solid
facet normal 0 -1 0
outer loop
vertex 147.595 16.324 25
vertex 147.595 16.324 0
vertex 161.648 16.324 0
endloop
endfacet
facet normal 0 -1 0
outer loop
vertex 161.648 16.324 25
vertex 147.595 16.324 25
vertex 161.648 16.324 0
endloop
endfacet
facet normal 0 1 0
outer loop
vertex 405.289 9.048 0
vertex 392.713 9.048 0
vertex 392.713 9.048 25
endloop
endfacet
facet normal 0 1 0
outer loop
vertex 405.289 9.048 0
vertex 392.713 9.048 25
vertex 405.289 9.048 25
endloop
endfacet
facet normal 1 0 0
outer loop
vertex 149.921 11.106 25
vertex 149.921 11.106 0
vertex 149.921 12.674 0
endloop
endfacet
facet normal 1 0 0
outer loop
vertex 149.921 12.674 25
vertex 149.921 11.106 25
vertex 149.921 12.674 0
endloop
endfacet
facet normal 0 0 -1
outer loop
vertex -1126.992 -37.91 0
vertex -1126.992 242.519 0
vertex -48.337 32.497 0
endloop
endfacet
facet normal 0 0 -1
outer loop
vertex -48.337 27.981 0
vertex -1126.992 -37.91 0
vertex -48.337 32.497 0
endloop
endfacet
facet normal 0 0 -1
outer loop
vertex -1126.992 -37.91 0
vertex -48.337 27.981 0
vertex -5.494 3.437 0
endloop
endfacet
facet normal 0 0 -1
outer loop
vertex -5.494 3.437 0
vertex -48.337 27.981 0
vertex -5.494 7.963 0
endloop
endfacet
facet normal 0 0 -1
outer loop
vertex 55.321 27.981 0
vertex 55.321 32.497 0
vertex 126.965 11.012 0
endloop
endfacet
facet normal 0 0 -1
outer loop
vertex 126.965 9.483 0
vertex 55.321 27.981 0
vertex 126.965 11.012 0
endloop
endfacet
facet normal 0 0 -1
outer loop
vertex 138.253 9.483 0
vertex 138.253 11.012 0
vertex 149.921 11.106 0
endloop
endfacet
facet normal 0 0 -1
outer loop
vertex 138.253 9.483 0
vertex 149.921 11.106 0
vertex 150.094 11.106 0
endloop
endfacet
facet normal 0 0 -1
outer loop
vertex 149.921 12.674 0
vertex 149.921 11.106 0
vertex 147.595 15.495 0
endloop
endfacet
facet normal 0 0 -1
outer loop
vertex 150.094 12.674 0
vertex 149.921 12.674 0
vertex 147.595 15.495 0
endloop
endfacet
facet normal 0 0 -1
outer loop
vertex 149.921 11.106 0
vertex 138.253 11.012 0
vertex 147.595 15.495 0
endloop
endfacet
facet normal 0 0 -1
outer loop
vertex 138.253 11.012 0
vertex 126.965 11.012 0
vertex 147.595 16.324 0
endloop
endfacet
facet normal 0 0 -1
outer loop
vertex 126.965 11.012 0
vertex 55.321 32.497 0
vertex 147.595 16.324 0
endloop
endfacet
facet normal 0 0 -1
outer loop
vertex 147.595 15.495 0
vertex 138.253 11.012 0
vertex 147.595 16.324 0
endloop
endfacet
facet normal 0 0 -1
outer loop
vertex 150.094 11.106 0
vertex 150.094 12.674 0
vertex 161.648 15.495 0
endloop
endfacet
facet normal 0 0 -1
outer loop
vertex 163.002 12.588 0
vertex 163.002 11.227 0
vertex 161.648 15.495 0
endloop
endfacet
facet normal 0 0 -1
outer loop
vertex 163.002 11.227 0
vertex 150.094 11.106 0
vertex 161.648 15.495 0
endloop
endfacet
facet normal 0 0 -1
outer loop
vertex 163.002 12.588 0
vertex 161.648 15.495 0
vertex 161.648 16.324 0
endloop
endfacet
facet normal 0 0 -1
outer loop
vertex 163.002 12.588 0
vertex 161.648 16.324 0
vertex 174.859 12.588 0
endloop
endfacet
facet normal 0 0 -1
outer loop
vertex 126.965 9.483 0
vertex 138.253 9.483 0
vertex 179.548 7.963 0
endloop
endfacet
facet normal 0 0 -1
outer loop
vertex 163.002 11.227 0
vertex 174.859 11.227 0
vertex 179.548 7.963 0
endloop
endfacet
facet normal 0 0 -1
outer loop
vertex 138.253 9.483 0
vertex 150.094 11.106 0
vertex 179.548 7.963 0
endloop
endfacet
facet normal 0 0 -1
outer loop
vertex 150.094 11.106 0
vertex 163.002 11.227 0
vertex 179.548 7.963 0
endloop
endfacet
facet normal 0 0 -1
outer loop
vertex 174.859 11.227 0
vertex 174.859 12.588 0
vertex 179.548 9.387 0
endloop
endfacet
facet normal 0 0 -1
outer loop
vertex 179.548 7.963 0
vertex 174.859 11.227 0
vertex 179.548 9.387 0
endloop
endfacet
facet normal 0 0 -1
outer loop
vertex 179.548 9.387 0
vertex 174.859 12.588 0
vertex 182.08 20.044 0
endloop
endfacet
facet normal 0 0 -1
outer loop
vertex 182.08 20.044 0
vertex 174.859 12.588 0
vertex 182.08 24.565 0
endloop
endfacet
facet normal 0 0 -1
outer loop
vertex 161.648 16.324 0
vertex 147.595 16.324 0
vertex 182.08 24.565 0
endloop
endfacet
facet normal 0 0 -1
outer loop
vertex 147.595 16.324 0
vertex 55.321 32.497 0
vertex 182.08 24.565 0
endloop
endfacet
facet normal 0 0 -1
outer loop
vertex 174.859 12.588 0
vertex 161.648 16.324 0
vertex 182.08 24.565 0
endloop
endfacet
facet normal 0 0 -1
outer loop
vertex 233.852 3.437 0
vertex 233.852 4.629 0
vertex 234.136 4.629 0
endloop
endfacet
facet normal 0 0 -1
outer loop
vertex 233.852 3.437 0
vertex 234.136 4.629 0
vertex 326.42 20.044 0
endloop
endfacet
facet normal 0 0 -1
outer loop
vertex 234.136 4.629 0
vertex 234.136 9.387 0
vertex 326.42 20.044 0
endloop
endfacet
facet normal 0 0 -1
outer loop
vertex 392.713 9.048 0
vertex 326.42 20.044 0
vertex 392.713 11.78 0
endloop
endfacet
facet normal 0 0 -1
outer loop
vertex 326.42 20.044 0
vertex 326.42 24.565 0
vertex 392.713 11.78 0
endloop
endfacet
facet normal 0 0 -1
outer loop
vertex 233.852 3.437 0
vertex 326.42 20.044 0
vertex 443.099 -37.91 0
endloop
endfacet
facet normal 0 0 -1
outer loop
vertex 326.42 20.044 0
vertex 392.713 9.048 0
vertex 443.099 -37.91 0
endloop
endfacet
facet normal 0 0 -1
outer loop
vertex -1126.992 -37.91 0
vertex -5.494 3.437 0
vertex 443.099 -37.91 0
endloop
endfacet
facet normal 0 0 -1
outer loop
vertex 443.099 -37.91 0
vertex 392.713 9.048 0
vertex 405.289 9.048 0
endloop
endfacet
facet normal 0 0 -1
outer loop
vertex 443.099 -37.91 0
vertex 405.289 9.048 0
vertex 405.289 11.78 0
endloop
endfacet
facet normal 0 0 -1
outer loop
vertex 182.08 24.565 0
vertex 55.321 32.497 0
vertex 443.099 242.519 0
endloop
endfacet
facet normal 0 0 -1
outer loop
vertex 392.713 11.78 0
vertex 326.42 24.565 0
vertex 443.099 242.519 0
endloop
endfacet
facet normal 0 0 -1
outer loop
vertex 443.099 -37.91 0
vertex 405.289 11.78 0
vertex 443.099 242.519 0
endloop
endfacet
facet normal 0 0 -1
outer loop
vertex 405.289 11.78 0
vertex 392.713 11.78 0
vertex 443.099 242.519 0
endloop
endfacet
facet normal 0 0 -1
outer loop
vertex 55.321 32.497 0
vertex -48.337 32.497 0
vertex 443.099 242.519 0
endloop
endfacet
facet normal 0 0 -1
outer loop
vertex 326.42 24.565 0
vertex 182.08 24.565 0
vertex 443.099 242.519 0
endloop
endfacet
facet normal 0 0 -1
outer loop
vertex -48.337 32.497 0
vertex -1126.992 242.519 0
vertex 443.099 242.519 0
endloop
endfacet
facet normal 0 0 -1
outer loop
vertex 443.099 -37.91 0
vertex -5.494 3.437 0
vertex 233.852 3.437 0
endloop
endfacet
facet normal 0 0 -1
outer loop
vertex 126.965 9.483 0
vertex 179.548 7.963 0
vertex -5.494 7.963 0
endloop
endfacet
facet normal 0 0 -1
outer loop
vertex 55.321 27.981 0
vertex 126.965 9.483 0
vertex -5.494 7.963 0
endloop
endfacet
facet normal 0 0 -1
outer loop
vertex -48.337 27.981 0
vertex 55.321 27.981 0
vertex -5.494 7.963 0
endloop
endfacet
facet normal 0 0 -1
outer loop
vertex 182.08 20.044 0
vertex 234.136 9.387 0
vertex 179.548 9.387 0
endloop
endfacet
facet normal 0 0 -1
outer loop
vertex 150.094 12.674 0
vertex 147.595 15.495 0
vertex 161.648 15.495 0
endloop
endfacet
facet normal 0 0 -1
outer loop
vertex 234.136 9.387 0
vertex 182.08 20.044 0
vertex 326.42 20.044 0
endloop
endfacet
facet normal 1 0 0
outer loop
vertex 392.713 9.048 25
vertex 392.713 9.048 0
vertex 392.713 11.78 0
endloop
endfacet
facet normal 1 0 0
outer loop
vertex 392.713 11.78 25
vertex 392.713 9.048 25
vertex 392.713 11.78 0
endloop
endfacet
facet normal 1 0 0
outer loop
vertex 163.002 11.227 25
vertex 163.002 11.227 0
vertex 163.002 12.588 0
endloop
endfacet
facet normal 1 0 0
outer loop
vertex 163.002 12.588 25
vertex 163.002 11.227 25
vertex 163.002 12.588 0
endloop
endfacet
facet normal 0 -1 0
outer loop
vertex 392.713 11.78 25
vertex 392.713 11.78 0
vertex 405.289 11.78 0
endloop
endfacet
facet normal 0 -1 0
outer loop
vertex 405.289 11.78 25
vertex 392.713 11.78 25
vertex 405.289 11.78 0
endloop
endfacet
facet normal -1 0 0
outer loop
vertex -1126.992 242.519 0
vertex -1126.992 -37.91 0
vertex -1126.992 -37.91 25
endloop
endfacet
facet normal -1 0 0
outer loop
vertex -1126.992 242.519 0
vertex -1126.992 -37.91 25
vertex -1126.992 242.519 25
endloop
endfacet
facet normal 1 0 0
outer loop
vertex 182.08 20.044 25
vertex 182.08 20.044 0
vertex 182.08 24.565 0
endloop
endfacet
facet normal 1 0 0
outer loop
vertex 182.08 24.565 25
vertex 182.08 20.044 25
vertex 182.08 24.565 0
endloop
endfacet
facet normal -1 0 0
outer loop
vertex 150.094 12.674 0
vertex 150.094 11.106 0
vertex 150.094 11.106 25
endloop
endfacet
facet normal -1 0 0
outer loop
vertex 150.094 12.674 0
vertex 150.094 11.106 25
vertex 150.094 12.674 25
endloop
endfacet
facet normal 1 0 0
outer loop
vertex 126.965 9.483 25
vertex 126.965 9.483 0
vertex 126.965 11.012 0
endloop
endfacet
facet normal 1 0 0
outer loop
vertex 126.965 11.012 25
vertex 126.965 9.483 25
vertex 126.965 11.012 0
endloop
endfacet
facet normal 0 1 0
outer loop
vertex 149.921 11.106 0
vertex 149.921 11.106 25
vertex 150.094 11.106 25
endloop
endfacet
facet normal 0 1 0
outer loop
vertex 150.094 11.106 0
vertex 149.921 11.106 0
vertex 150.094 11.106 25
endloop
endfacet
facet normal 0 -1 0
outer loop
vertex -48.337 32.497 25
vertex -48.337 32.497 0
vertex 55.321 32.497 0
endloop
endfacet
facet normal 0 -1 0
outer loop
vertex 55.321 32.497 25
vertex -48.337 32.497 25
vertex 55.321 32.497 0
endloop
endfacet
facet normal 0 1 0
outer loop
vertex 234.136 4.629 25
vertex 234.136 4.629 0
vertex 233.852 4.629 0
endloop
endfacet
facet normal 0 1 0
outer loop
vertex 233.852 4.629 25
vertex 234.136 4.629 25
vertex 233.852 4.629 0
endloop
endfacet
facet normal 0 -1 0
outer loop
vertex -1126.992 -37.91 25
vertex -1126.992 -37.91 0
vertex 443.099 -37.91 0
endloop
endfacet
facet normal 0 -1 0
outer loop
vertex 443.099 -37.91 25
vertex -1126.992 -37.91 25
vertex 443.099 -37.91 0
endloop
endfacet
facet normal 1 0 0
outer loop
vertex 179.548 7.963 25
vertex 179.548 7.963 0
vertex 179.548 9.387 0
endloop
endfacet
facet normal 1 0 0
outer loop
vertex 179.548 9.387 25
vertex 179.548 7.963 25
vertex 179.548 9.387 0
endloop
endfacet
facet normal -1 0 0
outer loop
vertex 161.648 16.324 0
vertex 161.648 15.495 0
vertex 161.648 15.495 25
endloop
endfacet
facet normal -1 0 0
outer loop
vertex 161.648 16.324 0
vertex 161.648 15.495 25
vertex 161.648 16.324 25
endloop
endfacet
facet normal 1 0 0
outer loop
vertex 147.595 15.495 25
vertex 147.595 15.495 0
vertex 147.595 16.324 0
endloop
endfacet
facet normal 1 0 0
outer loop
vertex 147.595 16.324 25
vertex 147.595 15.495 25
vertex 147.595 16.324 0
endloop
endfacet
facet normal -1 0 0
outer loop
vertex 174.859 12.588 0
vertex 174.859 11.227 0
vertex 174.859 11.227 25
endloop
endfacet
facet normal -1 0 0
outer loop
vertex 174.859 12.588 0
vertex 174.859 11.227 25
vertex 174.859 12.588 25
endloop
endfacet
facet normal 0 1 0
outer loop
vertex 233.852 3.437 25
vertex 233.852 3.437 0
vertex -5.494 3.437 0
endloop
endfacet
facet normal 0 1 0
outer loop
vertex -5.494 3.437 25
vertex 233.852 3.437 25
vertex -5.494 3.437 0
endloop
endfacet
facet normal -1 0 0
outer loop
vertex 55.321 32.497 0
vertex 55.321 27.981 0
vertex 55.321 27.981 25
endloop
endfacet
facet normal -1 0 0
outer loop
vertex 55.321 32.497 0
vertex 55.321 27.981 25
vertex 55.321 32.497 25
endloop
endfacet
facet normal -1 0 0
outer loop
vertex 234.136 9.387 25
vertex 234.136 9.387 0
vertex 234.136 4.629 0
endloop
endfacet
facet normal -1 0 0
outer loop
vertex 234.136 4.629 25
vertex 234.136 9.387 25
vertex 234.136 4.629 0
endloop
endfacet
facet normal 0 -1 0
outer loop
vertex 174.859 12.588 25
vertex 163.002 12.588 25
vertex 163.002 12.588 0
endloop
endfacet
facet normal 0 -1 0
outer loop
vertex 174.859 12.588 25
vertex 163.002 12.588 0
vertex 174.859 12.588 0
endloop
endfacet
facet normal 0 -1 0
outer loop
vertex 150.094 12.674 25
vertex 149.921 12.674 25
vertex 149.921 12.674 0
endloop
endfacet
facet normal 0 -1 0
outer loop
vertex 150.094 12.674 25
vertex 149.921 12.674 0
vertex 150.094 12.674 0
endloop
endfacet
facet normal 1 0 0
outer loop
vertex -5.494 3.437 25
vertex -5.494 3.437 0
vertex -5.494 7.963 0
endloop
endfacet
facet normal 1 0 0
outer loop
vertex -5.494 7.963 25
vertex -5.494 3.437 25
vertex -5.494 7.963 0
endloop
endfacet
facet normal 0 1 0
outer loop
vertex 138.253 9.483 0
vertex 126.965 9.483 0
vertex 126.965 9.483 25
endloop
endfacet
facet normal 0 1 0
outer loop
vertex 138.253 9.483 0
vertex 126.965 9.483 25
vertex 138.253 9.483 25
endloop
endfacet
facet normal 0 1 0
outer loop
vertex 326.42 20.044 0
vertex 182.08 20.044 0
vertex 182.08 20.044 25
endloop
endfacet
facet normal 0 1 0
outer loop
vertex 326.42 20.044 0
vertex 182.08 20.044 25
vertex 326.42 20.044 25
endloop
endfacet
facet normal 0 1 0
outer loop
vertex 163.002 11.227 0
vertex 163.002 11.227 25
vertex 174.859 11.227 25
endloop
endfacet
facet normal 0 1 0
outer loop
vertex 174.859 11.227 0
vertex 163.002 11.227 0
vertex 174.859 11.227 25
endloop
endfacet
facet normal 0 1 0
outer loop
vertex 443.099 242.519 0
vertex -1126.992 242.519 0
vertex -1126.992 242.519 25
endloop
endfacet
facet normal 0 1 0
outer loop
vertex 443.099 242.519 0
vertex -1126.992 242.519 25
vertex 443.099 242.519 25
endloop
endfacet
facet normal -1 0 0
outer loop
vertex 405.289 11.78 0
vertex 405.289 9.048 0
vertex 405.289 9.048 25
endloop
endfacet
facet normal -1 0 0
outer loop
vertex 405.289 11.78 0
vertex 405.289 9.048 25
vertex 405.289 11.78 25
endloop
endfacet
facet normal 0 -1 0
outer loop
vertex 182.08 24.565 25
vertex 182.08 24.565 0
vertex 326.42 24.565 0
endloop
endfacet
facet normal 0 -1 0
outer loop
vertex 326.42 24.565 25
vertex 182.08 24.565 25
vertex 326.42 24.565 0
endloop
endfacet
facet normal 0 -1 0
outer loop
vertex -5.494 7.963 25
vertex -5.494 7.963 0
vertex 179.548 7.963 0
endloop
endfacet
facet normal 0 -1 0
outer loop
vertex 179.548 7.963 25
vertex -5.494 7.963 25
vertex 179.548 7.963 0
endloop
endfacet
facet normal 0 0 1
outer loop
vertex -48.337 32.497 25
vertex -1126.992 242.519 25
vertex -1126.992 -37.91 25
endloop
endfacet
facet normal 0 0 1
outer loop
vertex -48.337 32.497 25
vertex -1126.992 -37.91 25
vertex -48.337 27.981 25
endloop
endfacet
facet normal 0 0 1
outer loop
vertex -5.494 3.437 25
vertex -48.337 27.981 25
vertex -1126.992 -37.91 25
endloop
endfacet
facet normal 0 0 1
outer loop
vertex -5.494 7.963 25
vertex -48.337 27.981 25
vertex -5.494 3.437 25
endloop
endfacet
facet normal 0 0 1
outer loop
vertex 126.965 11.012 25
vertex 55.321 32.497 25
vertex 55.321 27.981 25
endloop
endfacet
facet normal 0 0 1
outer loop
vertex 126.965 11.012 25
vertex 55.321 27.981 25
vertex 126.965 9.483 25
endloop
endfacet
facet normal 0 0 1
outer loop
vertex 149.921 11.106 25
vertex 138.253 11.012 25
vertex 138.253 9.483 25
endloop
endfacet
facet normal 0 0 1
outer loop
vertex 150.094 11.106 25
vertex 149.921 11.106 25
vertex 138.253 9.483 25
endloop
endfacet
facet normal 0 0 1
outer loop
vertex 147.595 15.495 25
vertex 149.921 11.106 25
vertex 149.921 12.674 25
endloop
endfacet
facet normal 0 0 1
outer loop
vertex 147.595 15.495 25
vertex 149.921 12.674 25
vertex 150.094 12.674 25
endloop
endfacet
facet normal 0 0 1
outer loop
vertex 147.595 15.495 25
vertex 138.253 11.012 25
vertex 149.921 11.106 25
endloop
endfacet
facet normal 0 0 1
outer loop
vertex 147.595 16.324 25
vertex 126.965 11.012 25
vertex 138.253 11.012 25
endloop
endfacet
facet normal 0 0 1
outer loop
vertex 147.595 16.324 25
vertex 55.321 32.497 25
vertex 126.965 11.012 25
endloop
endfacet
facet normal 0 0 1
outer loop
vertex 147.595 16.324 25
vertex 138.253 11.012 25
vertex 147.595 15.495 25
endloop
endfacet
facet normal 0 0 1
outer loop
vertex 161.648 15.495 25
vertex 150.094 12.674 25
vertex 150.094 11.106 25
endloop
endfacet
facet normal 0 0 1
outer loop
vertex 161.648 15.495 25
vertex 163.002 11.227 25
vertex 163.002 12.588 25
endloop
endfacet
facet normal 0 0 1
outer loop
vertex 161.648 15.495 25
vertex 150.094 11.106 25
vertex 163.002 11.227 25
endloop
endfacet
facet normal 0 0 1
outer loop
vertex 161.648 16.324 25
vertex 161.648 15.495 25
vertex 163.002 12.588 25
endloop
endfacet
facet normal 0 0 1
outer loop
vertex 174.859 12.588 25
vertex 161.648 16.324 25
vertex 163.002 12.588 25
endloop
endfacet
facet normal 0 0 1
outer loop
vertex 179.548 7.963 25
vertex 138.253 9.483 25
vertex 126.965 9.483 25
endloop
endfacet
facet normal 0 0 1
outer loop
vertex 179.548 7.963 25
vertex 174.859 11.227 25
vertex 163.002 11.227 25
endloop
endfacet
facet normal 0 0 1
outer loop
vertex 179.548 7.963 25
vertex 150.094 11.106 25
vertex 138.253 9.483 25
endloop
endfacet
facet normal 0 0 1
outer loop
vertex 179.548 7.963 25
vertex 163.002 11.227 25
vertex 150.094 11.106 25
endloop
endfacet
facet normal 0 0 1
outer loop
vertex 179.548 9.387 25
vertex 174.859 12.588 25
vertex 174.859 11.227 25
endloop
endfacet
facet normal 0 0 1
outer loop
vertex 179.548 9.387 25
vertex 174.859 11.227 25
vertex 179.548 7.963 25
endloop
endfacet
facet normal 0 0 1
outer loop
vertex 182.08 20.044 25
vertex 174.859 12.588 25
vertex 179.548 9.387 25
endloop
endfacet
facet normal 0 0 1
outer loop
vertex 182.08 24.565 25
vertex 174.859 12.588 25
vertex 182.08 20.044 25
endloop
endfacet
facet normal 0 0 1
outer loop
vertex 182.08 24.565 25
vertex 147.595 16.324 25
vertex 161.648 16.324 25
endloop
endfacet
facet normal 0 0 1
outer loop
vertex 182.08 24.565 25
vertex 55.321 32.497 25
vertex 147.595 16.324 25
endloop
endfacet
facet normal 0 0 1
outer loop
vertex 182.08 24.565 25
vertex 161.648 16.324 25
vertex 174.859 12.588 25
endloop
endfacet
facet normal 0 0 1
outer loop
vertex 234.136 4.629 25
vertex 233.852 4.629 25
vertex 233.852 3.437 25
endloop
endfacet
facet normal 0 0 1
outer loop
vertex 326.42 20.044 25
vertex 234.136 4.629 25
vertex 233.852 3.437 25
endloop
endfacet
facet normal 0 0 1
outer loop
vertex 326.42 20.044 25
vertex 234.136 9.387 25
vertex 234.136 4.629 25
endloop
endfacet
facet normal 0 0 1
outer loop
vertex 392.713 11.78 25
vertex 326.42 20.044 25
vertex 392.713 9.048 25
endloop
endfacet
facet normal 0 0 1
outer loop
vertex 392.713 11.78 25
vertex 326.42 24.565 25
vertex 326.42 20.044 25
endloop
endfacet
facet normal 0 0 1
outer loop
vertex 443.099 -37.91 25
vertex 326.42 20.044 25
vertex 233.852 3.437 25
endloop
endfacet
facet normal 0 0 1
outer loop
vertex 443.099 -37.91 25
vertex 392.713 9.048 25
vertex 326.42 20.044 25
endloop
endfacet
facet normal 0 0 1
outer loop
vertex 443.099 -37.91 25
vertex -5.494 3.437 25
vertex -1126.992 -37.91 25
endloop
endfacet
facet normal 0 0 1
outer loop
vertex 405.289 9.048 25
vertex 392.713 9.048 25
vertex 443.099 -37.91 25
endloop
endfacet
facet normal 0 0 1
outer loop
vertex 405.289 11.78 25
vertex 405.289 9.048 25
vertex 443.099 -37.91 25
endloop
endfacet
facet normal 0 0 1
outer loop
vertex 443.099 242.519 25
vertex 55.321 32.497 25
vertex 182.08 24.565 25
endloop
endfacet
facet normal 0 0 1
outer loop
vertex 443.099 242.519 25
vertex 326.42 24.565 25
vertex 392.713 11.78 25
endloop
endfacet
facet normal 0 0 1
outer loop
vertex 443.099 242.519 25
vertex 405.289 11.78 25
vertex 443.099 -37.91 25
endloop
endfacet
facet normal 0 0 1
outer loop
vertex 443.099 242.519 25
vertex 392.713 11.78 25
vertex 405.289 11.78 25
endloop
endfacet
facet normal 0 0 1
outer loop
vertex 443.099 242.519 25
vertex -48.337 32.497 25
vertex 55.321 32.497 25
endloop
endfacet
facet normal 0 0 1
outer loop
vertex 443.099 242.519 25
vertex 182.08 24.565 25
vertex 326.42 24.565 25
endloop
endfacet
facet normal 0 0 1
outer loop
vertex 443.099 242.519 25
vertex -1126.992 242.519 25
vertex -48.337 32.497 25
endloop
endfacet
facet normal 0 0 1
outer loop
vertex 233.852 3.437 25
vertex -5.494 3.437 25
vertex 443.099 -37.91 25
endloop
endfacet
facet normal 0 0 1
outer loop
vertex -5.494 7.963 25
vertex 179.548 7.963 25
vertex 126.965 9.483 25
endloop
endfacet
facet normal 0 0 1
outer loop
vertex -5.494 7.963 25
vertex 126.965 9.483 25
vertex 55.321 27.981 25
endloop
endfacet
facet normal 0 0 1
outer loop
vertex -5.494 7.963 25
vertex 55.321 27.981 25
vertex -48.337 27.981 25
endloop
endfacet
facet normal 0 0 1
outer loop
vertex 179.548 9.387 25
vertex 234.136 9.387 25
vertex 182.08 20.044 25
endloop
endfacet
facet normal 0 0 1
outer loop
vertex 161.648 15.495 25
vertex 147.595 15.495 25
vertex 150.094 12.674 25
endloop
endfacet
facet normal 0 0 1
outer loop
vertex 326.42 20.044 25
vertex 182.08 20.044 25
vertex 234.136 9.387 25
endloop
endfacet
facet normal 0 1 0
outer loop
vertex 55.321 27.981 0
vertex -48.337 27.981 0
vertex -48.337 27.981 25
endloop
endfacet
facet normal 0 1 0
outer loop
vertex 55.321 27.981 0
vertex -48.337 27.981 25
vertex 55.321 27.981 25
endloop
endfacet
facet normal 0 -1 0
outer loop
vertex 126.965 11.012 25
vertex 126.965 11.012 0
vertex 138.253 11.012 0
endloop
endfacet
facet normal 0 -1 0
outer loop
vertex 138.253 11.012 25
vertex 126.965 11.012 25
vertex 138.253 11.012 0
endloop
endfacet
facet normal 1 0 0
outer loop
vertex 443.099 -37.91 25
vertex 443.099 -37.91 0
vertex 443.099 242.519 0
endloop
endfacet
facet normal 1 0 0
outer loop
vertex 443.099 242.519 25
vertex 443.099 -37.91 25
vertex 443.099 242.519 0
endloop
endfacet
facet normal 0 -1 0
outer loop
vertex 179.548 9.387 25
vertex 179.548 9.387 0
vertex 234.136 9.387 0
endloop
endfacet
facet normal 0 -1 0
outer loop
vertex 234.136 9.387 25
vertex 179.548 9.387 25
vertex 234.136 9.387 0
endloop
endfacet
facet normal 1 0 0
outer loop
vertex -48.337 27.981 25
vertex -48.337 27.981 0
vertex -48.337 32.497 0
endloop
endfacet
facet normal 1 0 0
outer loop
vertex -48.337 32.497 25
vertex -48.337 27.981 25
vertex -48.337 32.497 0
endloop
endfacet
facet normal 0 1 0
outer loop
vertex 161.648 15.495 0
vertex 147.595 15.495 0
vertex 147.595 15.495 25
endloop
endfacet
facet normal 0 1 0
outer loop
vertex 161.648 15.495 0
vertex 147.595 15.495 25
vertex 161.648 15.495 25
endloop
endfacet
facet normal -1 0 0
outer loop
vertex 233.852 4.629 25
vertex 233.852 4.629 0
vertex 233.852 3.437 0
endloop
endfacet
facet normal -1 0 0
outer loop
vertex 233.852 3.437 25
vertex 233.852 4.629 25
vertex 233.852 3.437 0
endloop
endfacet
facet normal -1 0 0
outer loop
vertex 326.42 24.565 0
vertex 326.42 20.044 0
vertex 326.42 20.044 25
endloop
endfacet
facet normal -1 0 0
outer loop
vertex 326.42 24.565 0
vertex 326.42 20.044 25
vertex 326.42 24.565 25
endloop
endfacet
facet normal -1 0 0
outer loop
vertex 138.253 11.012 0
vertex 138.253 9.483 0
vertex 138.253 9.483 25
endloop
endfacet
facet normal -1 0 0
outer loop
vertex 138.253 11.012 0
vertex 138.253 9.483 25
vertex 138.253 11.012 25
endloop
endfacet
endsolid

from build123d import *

# Parameters (mm, degrees)
F0_W     = 1570.090592
F0_H     = 280.429076
F0_W_2   = 103.658766
F0_H_2   = 4.515674
F0_W_3   = 11.288195
F0_H_3   = 1.529689
F0_W_4   = 0.172824
F0_H_4   = 1.568052
F0_W_5   = 11.857286
F0_H_5   = 1.361676
F0_W_6   = 14.053285
F0_H_6   = 0.829553
F0_W_7   = 12.576282
F0_H_7   = 2.731625
F0_W_8   = 144.339084
F0_H_8   = 4.521026
F1_DEPTH = 25


with BuildPart() as f1:
    # F0 (on Top) → F1 (new body)
    with BuildSketch(Plane.XY):
        with Locations((-341.946453, 102.304155)):
            Rectangle(F0_W, F0_H)
        with Locations((3.491953, 30.238768)):
            Rectangle(F0_W_2, F0_H_2, mode=Mode.SUBTRACT)
        Polygon((114.178963, 3.437468), (-5.49449, 3.437468), (-5.49449, 7.963303), (114.178963, 7.963303), (167.111993, 7.963303), (179.547533, 7.963303), (179.547533, 9.387144), (234.135687, 9.387144), (234.135687, 4.629135), (233.852416, 4.629135), (233.852416, 3.437468), (167.111993, 3.437468), align=None, mode=Mode.SUBTRACT)
        with Locations((132.608905, 10.247366)):
            Rectangle(F0_W_3, F0_H_3, mode=Mode.SUBTRACT)
        with Locations((150.00771, 11.890458)):
            Rectangle(F0_W_4, F0_H_4, mode=Mode.SUBTRACT)
        with Locations((168.930627, 11.907446)):
            Rectangle(F0_W_5, F0_H_5, mode=Mode.SUBTRACT)
        with Locations((154.621362, 15.909721)):
            Rectangle(F0_W_6, F0_H_6, mode=Mode.SUBTRACT)
        with Locations((399.00133, 10.414176)):
            Rectangle(F0_W_7, F0_H_7, mode=Mode.SUBTRACT)
        with Locations((254.24999, 22.304791)):
            Rectangle(F0_W_8, F0_H_8, mode=Mode.SUBTRACT)
    extrude(amount=F1_DEPTH)


solid = f1.part
